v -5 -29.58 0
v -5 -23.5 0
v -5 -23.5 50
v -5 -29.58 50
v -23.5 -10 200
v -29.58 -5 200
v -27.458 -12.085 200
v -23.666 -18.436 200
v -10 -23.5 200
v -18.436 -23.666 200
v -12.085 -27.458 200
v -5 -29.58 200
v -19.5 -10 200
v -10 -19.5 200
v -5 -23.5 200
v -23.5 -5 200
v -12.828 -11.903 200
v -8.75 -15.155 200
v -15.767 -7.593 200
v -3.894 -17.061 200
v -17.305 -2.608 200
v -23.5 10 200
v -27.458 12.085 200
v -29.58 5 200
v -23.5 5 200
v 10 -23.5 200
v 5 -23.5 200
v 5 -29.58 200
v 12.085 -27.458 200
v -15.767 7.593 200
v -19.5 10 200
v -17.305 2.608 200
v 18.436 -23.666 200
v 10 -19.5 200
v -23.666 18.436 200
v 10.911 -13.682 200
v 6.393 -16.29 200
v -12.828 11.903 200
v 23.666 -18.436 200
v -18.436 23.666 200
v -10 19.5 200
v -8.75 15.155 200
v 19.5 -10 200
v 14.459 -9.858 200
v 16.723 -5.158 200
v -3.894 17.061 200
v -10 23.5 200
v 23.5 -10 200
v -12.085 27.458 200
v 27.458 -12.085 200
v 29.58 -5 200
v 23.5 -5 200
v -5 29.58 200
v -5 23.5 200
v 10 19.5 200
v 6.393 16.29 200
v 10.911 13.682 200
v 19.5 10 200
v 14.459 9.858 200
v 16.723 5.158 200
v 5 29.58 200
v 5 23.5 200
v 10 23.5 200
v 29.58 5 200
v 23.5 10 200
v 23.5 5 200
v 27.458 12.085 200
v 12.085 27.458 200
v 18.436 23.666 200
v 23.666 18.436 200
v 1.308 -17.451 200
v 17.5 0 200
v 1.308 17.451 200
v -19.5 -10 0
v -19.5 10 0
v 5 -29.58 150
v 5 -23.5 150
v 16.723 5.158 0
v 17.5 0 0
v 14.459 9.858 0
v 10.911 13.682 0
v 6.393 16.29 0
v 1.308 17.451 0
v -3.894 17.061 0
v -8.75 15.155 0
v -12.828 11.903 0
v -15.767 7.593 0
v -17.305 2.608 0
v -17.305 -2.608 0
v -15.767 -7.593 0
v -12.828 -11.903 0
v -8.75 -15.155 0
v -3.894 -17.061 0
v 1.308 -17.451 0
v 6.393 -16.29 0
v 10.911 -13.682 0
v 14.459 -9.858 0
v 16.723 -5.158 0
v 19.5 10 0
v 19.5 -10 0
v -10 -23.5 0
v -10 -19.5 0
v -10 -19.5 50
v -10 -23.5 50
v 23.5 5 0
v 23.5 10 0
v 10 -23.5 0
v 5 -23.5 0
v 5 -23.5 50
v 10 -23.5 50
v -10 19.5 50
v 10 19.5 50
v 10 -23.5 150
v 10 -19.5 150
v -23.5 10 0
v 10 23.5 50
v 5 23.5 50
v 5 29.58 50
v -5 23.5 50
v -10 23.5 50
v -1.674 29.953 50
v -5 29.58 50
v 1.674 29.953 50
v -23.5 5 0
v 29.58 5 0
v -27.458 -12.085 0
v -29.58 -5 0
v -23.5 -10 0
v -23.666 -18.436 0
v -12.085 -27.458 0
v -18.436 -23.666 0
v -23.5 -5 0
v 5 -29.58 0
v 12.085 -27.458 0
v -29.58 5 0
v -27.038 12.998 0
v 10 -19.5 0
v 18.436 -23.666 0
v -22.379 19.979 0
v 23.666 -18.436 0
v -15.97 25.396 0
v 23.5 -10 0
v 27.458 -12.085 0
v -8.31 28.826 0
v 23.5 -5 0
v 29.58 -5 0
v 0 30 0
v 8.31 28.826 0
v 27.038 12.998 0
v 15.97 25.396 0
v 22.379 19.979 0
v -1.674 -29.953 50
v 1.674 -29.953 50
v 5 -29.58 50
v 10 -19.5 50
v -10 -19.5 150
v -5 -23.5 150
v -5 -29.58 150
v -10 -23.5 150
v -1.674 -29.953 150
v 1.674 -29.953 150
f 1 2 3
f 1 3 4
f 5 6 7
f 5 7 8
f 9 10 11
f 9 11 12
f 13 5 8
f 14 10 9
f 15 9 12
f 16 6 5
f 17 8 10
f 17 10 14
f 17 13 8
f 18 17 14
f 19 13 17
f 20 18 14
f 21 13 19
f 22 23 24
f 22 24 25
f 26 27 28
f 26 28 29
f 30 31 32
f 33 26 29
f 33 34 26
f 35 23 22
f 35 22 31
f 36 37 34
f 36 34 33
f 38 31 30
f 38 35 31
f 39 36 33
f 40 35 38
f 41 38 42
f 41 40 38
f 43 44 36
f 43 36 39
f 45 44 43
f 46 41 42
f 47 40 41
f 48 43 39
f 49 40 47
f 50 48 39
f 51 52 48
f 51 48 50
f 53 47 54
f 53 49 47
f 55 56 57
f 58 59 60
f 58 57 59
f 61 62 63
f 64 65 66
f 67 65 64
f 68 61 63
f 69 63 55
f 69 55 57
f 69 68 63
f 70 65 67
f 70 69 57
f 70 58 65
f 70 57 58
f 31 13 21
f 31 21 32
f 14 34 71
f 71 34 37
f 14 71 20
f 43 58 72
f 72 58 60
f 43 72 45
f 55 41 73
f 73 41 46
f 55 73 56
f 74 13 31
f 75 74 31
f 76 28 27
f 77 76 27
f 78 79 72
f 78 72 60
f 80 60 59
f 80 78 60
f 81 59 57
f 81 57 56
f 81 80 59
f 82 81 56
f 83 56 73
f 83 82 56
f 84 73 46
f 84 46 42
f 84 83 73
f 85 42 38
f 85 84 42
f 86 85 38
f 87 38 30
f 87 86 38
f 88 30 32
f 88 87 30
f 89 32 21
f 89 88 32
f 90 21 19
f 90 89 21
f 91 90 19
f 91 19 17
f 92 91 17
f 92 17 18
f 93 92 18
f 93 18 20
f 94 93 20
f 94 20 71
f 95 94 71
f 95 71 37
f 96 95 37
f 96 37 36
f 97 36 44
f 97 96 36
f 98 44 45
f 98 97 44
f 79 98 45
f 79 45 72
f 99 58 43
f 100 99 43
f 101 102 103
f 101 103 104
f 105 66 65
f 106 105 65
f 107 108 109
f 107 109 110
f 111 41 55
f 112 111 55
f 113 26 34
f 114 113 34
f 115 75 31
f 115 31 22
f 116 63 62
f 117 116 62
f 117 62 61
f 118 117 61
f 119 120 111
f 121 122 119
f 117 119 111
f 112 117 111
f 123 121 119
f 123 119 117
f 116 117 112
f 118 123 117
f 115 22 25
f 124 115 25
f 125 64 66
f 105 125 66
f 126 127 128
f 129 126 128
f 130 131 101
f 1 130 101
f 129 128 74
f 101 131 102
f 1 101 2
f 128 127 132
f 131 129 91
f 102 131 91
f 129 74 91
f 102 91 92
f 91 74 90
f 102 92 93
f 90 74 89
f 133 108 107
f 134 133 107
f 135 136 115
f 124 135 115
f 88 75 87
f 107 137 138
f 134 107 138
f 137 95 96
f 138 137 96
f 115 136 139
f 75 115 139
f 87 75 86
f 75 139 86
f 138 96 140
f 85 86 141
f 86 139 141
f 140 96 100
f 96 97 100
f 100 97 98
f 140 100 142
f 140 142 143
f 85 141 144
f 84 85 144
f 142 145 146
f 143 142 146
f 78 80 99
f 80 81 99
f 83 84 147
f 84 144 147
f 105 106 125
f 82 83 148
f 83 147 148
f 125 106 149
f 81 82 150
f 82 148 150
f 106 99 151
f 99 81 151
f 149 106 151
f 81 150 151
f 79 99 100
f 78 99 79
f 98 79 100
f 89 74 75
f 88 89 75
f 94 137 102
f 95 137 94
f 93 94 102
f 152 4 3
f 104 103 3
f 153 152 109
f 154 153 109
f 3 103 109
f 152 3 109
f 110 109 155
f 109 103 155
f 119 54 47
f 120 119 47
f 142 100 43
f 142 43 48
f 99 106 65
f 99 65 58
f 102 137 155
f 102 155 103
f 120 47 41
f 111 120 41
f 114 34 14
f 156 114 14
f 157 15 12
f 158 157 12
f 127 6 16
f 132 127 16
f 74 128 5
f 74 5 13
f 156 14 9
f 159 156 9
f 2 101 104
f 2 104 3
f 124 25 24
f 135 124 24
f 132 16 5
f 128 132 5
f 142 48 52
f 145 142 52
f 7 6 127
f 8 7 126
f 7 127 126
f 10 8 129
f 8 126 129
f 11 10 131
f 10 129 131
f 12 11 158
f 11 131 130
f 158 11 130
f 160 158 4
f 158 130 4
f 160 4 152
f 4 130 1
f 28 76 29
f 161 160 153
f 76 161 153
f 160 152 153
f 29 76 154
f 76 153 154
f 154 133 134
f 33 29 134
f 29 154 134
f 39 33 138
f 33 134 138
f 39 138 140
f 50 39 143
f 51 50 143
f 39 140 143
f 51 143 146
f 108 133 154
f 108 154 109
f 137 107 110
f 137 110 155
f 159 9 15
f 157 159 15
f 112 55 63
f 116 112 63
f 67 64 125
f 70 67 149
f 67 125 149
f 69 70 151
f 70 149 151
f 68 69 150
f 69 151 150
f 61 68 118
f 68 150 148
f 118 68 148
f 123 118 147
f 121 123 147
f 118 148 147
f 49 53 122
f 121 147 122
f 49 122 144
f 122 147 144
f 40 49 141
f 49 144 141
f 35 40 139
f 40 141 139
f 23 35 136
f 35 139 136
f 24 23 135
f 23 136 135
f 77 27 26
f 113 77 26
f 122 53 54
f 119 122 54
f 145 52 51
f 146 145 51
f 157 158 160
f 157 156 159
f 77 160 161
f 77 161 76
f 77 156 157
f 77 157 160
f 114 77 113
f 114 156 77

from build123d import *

# Parameters (mm, degrees)
SKETCH1_R           = 30
SKETCH1_R_2         = 17.5
BOSS_EXTRUDE1_DEPTH = 200
CUT_EXTRUDE1_START  = -150
CUT_EXTRUDE1_DEPTH  = 150
CUT_EXTRUDE2_START  = -50
CUT_EXTRUDE2_DEPTH  = 50
CUT_EXTRUDE3_DEPTH  = 205.450483003


with BuildPart() as part:
    # Sketch1 → Boss-Extrude1 (new body)
    with BuildSketch(Plane.XY):
        Circle(SKETCH1_R)
        Circle(SKETCH1_R_2, mode=Mode.SUBTRACT)
    extrude(amount=BOSS_EXTRUDE1_DEPTH)

    # Sketch2 → Cut-Extrude1 (cut)
    with BuildSketch(Plane.XY.offset(200).offset(CUT_EXTRUDE1_START)):
        with BuildLine():
            Line((-10, 23.5), (-10, 19.5))
            Line((-10, 19.5), (10, 19.5))
            Line((10, 19.5), (10, 23.5))
            Line((10, 23.5), (5, 23.5))
            Line((5, 23.5), (5, 29.580398915))
            ThreePointArc((5, 29.580398915), (0, 30), (-5, 29.580398915))
            Line((-5, 29.580398915), (-5, 23.5))
            Line((-5, 23.5), (-10, 23.5))
        make_face()
    extrude(amount=CUT_EXTRUDE1_DEPTH, mode=Mode.SUBTRACT)

    # Sketch2<3> → Cut-Extrude2 (cut)
    with BuildSketch(Plane.XY.offset(200).offset(CUT_EXTRUDE2_START)):
        with BuildLine():
            Line((-5, -23.5), (-5, -29.580398915))
            ThreePointArc((-5, -29.580398915), (0, -30), (5, -29.580398915))
            Line((5, -29.580398915), (5, -23.5))
            Line((5, -23.5), (10, -23.5))
            Line((10, -23.5), (10, -19.5))
            Line((10, -19.5), (-10, -19.5))
            Line((-10, -19.5), (-10, -23.5))
            Line((-10, -23.5), (-5, -23.5))
        make_face()
    cut_extrude2 = extrude(amount=CUT_EXTRUDE2_DEPTH, mode=Mode.SUBTRACT)

    # Mirror1: Cut-Extrude2 across plane
    add(cut_extrude2.mirror(Plane.XY.offset(100)), mode=Mode.SUBTRACT)

    # Sketch2<5> → Cut-Extrude3 (cut, through all)
    with BuildSketch(Plane.XY.offset(200)):
        with BuildLine():
            Line((-23.5, 5), (-29.580398915, 5))
            ThreePointArc((-29.580398915, 5), (-30, 0), (-29.580398915, -5))
            Line((-29.580398915, -5), (-23.5, -5))
            Line((-23.5, -5), (-23.5, -10))
            Line((-23.5, -10), (-19.5, -10))
            Line((-19.5, -10), (-19.5, 10))
            Line((-19.5, 10), (-23.5, 10))
            Line((-23.5, 10), (-23.5, 5))
        make_face()
        with BuildLine():
            ThreePointArc((29.580398915, -5), (30, 0), (29.580398915, 5))
            Line((29.580398915, 5), (23.5, 5))
            Line((23.5, 5), (23.5, 10))
            Line((23.5, 10), (19.5, 10))
            Line((19.5, 10), (19.5, -10))
            Line((19.5, -10), (23.5, -10))
            Line((23.5, -10), (23.5, -5))
            Line((23.5, -5), (29.580398915, -5))
        make_face()
    extrude(amount=-CUT_EXTRUDE3_DEPTH, mode=Mode.SUBTRACT)


solid = part.part
